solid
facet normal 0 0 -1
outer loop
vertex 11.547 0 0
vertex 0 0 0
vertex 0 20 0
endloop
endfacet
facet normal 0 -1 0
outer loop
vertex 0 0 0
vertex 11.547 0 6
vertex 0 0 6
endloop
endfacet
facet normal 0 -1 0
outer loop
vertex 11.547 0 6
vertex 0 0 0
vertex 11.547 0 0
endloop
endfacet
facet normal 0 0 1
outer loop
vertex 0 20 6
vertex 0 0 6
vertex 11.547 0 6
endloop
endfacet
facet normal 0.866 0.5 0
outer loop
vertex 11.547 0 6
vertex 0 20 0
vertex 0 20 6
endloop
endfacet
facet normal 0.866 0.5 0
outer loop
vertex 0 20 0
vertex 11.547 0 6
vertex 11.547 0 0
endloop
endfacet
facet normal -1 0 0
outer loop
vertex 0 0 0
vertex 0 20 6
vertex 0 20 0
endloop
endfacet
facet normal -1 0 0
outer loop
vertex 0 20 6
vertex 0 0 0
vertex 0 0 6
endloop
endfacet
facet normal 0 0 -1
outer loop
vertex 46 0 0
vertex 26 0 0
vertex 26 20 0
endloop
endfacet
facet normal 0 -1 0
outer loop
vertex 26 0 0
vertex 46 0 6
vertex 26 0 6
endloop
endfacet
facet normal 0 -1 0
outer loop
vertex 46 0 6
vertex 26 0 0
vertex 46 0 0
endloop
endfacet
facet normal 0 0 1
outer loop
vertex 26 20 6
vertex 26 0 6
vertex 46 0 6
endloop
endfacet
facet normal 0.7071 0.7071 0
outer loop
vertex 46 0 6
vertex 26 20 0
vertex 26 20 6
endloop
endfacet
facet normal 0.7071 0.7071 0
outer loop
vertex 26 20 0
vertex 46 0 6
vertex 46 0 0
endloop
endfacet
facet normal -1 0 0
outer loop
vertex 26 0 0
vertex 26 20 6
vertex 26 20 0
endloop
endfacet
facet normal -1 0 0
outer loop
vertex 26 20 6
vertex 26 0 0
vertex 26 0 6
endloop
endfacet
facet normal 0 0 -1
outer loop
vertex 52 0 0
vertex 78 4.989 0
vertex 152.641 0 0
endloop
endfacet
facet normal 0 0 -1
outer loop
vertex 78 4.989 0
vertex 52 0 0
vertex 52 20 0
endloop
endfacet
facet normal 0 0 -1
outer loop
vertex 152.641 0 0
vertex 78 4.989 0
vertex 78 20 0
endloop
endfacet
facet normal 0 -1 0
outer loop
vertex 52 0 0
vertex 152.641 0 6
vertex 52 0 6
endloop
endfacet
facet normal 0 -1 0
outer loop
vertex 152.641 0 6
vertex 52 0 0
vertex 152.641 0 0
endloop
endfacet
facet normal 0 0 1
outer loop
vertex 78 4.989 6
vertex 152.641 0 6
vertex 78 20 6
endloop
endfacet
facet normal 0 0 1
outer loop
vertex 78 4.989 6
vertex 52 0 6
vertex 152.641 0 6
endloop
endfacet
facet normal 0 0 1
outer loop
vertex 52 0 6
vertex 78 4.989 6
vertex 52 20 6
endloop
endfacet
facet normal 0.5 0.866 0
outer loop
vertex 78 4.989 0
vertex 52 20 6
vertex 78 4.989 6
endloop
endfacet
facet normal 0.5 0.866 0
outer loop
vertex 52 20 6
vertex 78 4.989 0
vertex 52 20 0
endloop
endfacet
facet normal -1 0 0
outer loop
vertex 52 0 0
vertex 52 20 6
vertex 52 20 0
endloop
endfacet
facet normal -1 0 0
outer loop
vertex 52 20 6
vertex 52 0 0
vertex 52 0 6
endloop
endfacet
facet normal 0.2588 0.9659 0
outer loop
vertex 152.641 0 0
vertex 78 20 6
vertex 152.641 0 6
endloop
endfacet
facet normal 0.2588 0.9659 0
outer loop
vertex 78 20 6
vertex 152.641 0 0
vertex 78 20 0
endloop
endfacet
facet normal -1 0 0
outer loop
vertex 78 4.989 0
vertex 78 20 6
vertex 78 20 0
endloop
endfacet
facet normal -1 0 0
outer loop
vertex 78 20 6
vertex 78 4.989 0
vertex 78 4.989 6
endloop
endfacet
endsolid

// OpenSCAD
// Overhang angle sweep: fins at increasing angle from vertical
// (30, 45, 60, 75 degrees) to illustrate the ~45deg self-support limit.
$fn = 0;
H = 20; thick = 6; spacing = 26;
angles = [30, 45, 60, 75];

module fin(angle) {
    L = H * tan(angle);
    linear_extrude(height = thick)
    polygon(points = [[0, 0], [0, H], [L, 0]]);
}

for (i = [0 : len(angles) - 1])
    translate([i * spacing, 0, 0]) fin(angles[i]);
